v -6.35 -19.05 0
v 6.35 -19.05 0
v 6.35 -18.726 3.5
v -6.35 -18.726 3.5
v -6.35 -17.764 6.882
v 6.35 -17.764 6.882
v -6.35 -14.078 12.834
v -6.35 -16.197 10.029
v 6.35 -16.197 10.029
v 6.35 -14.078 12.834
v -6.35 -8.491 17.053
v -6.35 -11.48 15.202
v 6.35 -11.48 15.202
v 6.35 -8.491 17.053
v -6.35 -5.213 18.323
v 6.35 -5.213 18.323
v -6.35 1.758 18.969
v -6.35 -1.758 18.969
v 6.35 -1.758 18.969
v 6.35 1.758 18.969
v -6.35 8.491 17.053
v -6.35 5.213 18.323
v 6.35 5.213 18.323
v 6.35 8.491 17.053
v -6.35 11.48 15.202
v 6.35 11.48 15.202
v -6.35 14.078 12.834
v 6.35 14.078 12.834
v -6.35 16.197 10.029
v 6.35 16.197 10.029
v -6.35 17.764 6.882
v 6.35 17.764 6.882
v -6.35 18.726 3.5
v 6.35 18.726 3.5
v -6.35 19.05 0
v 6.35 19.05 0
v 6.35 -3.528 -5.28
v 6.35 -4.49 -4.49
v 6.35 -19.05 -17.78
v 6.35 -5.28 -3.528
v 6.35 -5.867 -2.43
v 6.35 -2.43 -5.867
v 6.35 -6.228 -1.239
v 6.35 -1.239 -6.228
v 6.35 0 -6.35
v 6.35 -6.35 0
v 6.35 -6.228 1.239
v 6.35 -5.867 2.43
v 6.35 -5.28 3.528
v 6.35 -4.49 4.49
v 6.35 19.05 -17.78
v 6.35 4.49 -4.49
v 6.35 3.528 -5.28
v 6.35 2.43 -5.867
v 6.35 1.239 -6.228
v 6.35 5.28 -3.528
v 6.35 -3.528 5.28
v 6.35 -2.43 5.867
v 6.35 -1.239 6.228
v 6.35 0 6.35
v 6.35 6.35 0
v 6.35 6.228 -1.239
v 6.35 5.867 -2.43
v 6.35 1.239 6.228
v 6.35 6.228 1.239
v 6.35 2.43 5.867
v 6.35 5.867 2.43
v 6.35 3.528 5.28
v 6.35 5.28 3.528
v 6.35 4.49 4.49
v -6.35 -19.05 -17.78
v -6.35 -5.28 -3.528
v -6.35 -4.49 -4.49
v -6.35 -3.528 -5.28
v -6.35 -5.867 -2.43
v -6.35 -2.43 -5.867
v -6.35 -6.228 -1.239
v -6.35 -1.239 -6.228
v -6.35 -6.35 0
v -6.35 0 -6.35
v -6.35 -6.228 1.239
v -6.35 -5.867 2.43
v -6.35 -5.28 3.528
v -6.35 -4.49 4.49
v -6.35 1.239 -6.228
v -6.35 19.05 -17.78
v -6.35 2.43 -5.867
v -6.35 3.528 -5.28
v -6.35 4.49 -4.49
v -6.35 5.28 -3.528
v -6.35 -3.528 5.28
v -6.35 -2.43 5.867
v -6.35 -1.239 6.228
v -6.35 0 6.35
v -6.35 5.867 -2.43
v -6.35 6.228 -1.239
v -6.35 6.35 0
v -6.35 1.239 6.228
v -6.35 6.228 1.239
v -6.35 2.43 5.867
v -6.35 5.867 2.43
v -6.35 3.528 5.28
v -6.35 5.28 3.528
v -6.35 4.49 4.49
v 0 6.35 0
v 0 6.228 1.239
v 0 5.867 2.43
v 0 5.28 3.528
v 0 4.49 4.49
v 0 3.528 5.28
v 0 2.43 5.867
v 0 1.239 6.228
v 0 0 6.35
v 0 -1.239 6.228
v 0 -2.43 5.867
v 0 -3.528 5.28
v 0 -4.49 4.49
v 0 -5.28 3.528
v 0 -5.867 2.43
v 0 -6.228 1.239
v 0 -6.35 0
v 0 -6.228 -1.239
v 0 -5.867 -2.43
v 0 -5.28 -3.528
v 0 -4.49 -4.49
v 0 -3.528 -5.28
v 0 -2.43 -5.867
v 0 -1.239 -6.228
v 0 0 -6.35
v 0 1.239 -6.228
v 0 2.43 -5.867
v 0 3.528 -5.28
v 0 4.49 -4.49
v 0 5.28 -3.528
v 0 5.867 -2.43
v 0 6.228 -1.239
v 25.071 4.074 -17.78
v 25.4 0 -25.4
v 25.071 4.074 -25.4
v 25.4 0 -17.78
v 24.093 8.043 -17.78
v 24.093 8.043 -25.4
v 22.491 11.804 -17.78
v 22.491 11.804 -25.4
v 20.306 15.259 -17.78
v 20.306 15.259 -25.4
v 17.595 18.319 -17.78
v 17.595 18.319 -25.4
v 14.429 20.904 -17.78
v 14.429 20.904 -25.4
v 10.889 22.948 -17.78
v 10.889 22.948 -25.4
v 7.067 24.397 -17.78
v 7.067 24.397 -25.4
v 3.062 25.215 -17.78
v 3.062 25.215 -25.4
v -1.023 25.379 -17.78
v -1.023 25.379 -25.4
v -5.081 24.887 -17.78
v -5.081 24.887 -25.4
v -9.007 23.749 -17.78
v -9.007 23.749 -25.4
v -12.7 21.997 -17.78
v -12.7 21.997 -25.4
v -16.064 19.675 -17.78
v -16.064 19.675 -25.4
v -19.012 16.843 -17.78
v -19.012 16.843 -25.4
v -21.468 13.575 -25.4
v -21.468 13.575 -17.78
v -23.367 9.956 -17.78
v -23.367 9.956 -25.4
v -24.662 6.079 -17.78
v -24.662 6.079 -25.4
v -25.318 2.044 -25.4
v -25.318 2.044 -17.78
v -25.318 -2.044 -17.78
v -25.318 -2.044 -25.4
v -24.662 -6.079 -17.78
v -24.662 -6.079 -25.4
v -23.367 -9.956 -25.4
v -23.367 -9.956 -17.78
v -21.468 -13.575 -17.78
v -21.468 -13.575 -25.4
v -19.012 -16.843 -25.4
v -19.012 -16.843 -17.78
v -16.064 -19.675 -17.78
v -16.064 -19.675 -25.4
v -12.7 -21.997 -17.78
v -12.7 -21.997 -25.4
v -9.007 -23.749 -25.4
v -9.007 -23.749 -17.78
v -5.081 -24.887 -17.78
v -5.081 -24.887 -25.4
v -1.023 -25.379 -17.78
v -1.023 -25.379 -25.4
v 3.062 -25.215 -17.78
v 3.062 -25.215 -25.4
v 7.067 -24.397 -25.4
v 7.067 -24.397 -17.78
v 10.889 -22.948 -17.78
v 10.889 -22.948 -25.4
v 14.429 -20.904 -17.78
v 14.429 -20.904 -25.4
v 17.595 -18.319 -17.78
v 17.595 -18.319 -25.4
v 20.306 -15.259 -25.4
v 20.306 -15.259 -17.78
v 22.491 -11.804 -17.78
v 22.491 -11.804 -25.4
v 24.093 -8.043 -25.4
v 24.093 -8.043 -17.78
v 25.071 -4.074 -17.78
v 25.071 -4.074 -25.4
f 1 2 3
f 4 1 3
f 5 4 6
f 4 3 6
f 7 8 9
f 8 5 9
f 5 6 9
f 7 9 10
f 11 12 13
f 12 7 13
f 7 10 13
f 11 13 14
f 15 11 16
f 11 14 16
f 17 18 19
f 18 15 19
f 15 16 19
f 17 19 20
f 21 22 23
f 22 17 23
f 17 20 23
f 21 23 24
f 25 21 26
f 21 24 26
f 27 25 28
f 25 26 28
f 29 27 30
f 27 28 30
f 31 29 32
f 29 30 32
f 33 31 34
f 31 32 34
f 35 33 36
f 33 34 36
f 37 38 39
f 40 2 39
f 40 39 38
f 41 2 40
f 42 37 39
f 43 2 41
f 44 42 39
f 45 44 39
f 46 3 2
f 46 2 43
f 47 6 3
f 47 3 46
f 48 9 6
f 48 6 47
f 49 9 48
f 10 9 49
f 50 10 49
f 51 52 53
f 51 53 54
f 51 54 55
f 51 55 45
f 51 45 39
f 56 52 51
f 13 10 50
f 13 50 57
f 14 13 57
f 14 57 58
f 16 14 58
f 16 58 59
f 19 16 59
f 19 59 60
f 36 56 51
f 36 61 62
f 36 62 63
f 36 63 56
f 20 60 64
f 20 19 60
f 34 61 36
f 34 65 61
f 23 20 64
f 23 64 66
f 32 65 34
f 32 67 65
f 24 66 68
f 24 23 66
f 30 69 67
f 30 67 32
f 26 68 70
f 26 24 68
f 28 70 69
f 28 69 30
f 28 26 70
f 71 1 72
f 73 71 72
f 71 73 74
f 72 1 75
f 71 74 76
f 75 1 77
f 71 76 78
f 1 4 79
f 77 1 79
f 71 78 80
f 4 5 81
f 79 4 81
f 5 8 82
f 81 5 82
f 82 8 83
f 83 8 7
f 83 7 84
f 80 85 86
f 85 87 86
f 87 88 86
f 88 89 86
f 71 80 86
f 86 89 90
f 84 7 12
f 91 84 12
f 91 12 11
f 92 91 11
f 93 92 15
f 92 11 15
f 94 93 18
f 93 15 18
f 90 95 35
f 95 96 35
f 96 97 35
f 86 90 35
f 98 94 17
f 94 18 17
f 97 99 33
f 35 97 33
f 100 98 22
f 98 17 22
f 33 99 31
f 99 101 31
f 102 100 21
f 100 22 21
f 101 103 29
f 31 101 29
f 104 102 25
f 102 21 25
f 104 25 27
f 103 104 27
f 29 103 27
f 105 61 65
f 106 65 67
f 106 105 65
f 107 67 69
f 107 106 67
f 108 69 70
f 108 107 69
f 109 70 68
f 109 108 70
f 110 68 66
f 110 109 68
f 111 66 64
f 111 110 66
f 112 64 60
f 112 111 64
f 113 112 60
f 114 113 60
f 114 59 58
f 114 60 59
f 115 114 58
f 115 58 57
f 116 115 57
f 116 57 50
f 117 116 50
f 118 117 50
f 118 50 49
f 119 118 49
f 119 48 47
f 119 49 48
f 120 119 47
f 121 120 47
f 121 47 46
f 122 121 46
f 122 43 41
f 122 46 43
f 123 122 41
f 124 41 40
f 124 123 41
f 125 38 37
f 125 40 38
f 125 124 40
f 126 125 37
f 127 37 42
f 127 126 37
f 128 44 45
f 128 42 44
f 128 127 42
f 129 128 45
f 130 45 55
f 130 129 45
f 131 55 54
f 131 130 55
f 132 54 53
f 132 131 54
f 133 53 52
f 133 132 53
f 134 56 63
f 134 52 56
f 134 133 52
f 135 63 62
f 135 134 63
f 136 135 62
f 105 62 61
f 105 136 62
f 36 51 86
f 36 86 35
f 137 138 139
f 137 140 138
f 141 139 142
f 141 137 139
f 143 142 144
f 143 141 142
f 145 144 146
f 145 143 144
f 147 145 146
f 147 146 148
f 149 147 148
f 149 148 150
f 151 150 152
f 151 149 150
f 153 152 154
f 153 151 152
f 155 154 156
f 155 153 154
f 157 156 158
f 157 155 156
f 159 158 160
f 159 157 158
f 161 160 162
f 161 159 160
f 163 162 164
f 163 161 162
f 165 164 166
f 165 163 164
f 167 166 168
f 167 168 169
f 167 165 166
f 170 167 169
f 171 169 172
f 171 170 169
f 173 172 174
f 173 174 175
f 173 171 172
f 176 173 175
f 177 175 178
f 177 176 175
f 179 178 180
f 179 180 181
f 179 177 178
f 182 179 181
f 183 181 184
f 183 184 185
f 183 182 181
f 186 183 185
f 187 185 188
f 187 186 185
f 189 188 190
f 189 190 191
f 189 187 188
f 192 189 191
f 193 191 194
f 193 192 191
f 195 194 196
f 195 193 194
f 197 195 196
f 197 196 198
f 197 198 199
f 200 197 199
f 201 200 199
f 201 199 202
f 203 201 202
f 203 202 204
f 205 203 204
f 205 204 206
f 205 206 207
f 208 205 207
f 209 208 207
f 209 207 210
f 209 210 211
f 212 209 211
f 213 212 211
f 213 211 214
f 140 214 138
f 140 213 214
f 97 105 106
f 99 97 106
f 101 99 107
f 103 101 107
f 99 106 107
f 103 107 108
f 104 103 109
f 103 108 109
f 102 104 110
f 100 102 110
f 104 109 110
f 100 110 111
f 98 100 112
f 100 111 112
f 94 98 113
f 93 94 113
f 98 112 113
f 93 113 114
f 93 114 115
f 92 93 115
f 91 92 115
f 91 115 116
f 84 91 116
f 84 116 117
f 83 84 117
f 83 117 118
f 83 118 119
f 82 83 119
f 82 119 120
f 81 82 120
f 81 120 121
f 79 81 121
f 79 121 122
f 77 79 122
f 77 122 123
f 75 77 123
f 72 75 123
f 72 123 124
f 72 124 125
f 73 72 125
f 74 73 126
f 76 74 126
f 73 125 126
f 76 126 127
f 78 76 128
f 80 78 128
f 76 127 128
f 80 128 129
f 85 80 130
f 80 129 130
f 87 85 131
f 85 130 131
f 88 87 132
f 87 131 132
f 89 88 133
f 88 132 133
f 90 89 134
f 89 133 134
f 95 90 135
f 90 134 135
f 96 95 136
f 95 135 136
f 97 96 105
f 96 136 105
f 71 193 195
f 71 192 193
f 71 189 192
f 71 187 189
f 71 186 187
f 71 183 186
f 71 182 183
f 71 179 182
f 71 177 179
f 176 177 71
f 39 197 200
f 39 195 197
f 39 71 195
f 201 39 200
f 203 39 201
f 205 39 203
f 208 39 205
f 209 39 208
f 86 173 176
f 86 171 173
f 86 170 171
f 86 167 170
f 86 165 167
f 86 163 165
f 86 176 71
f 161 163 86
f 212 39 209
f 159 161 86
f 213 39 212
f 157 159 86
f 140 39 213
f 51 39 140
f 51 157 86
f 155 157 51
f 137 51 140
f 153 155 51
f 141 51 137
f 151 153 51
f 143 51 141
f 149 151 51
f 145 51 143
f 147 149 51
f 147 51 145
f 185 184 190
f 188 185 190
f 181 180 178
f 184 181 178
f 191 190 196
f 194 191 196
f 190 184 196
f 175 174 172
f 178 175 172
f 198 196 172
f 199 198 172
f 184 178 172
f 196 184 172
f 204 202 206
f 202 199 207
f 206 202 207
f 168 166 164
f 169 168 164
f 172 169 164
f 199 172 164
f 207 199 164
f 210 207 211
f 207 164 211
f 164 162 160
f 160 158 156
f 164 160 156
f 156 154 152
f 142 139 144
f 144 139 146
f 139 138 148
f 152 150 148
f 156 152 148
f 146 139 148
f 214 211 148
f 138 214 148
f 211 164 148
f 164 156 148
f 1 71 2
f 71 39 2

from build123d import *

# Parameters (mm, degrees)
F0_R     = 25.4
F1_DEPTH = 25.4
F2_W     = 25.4
F2_H     = 76.2
F2_H_2   = 76.310582
F3_DEPTH = 43.18
F4_R     = 6.35
F4_W     = 19.05
F4_H     = 17.78
F5_DEPTH = 25.4


with BuildPart() as f1:
    # F0 (on Top) → F1 (new body, symmetric)
    with BuildSketch(Plane.XY):
        Circle(F0_R)
    extrude(amount=F1_DEPTH, both=True)

    # F2 (on face) → F3 (cut)
    with BuildSketch(Plane.XY.offset(25.4)):
        with Locations((-19.05, 0)):
            Rectangle(F2_W, F2_H)
        with Locations((19.05, -0.055291)):
            Rectangle(F2_W, F2_H_2)
    extrude(amount=-F3_DEPTH, mode=Mode.SUBTRACT)

    # F4 (on Right) → F5 (cut, symmetric)
    with BuildSketch(Plane.YZ):
        Circle(F4_R)
        with BuildLine():
            ThreePointArc((-19.05, 0), (0, 19.05), (19.05, 0))
            Line((19.05, 0), (38.1, 0))
            Line((38.1, 0), (38.1, 38.1))
            Line((38.1, 38.1), (-38.1, 38.1))
            Line((-38.1, 38.1), (-38.1, 0))
            Line((-38.1, 0), (-19.05, 0))
        make_face()
        with Locations((28.575, -8.89)):
            Rectangle(F4_W, F4_H)
        with Locations((-28.575, -8.89)):
            Rectangle(F4_W, F4_H)
    extrude(amount=F5_DEPTH, both=True, mode=Mode.SUBTRACT)


solid = f1.part
